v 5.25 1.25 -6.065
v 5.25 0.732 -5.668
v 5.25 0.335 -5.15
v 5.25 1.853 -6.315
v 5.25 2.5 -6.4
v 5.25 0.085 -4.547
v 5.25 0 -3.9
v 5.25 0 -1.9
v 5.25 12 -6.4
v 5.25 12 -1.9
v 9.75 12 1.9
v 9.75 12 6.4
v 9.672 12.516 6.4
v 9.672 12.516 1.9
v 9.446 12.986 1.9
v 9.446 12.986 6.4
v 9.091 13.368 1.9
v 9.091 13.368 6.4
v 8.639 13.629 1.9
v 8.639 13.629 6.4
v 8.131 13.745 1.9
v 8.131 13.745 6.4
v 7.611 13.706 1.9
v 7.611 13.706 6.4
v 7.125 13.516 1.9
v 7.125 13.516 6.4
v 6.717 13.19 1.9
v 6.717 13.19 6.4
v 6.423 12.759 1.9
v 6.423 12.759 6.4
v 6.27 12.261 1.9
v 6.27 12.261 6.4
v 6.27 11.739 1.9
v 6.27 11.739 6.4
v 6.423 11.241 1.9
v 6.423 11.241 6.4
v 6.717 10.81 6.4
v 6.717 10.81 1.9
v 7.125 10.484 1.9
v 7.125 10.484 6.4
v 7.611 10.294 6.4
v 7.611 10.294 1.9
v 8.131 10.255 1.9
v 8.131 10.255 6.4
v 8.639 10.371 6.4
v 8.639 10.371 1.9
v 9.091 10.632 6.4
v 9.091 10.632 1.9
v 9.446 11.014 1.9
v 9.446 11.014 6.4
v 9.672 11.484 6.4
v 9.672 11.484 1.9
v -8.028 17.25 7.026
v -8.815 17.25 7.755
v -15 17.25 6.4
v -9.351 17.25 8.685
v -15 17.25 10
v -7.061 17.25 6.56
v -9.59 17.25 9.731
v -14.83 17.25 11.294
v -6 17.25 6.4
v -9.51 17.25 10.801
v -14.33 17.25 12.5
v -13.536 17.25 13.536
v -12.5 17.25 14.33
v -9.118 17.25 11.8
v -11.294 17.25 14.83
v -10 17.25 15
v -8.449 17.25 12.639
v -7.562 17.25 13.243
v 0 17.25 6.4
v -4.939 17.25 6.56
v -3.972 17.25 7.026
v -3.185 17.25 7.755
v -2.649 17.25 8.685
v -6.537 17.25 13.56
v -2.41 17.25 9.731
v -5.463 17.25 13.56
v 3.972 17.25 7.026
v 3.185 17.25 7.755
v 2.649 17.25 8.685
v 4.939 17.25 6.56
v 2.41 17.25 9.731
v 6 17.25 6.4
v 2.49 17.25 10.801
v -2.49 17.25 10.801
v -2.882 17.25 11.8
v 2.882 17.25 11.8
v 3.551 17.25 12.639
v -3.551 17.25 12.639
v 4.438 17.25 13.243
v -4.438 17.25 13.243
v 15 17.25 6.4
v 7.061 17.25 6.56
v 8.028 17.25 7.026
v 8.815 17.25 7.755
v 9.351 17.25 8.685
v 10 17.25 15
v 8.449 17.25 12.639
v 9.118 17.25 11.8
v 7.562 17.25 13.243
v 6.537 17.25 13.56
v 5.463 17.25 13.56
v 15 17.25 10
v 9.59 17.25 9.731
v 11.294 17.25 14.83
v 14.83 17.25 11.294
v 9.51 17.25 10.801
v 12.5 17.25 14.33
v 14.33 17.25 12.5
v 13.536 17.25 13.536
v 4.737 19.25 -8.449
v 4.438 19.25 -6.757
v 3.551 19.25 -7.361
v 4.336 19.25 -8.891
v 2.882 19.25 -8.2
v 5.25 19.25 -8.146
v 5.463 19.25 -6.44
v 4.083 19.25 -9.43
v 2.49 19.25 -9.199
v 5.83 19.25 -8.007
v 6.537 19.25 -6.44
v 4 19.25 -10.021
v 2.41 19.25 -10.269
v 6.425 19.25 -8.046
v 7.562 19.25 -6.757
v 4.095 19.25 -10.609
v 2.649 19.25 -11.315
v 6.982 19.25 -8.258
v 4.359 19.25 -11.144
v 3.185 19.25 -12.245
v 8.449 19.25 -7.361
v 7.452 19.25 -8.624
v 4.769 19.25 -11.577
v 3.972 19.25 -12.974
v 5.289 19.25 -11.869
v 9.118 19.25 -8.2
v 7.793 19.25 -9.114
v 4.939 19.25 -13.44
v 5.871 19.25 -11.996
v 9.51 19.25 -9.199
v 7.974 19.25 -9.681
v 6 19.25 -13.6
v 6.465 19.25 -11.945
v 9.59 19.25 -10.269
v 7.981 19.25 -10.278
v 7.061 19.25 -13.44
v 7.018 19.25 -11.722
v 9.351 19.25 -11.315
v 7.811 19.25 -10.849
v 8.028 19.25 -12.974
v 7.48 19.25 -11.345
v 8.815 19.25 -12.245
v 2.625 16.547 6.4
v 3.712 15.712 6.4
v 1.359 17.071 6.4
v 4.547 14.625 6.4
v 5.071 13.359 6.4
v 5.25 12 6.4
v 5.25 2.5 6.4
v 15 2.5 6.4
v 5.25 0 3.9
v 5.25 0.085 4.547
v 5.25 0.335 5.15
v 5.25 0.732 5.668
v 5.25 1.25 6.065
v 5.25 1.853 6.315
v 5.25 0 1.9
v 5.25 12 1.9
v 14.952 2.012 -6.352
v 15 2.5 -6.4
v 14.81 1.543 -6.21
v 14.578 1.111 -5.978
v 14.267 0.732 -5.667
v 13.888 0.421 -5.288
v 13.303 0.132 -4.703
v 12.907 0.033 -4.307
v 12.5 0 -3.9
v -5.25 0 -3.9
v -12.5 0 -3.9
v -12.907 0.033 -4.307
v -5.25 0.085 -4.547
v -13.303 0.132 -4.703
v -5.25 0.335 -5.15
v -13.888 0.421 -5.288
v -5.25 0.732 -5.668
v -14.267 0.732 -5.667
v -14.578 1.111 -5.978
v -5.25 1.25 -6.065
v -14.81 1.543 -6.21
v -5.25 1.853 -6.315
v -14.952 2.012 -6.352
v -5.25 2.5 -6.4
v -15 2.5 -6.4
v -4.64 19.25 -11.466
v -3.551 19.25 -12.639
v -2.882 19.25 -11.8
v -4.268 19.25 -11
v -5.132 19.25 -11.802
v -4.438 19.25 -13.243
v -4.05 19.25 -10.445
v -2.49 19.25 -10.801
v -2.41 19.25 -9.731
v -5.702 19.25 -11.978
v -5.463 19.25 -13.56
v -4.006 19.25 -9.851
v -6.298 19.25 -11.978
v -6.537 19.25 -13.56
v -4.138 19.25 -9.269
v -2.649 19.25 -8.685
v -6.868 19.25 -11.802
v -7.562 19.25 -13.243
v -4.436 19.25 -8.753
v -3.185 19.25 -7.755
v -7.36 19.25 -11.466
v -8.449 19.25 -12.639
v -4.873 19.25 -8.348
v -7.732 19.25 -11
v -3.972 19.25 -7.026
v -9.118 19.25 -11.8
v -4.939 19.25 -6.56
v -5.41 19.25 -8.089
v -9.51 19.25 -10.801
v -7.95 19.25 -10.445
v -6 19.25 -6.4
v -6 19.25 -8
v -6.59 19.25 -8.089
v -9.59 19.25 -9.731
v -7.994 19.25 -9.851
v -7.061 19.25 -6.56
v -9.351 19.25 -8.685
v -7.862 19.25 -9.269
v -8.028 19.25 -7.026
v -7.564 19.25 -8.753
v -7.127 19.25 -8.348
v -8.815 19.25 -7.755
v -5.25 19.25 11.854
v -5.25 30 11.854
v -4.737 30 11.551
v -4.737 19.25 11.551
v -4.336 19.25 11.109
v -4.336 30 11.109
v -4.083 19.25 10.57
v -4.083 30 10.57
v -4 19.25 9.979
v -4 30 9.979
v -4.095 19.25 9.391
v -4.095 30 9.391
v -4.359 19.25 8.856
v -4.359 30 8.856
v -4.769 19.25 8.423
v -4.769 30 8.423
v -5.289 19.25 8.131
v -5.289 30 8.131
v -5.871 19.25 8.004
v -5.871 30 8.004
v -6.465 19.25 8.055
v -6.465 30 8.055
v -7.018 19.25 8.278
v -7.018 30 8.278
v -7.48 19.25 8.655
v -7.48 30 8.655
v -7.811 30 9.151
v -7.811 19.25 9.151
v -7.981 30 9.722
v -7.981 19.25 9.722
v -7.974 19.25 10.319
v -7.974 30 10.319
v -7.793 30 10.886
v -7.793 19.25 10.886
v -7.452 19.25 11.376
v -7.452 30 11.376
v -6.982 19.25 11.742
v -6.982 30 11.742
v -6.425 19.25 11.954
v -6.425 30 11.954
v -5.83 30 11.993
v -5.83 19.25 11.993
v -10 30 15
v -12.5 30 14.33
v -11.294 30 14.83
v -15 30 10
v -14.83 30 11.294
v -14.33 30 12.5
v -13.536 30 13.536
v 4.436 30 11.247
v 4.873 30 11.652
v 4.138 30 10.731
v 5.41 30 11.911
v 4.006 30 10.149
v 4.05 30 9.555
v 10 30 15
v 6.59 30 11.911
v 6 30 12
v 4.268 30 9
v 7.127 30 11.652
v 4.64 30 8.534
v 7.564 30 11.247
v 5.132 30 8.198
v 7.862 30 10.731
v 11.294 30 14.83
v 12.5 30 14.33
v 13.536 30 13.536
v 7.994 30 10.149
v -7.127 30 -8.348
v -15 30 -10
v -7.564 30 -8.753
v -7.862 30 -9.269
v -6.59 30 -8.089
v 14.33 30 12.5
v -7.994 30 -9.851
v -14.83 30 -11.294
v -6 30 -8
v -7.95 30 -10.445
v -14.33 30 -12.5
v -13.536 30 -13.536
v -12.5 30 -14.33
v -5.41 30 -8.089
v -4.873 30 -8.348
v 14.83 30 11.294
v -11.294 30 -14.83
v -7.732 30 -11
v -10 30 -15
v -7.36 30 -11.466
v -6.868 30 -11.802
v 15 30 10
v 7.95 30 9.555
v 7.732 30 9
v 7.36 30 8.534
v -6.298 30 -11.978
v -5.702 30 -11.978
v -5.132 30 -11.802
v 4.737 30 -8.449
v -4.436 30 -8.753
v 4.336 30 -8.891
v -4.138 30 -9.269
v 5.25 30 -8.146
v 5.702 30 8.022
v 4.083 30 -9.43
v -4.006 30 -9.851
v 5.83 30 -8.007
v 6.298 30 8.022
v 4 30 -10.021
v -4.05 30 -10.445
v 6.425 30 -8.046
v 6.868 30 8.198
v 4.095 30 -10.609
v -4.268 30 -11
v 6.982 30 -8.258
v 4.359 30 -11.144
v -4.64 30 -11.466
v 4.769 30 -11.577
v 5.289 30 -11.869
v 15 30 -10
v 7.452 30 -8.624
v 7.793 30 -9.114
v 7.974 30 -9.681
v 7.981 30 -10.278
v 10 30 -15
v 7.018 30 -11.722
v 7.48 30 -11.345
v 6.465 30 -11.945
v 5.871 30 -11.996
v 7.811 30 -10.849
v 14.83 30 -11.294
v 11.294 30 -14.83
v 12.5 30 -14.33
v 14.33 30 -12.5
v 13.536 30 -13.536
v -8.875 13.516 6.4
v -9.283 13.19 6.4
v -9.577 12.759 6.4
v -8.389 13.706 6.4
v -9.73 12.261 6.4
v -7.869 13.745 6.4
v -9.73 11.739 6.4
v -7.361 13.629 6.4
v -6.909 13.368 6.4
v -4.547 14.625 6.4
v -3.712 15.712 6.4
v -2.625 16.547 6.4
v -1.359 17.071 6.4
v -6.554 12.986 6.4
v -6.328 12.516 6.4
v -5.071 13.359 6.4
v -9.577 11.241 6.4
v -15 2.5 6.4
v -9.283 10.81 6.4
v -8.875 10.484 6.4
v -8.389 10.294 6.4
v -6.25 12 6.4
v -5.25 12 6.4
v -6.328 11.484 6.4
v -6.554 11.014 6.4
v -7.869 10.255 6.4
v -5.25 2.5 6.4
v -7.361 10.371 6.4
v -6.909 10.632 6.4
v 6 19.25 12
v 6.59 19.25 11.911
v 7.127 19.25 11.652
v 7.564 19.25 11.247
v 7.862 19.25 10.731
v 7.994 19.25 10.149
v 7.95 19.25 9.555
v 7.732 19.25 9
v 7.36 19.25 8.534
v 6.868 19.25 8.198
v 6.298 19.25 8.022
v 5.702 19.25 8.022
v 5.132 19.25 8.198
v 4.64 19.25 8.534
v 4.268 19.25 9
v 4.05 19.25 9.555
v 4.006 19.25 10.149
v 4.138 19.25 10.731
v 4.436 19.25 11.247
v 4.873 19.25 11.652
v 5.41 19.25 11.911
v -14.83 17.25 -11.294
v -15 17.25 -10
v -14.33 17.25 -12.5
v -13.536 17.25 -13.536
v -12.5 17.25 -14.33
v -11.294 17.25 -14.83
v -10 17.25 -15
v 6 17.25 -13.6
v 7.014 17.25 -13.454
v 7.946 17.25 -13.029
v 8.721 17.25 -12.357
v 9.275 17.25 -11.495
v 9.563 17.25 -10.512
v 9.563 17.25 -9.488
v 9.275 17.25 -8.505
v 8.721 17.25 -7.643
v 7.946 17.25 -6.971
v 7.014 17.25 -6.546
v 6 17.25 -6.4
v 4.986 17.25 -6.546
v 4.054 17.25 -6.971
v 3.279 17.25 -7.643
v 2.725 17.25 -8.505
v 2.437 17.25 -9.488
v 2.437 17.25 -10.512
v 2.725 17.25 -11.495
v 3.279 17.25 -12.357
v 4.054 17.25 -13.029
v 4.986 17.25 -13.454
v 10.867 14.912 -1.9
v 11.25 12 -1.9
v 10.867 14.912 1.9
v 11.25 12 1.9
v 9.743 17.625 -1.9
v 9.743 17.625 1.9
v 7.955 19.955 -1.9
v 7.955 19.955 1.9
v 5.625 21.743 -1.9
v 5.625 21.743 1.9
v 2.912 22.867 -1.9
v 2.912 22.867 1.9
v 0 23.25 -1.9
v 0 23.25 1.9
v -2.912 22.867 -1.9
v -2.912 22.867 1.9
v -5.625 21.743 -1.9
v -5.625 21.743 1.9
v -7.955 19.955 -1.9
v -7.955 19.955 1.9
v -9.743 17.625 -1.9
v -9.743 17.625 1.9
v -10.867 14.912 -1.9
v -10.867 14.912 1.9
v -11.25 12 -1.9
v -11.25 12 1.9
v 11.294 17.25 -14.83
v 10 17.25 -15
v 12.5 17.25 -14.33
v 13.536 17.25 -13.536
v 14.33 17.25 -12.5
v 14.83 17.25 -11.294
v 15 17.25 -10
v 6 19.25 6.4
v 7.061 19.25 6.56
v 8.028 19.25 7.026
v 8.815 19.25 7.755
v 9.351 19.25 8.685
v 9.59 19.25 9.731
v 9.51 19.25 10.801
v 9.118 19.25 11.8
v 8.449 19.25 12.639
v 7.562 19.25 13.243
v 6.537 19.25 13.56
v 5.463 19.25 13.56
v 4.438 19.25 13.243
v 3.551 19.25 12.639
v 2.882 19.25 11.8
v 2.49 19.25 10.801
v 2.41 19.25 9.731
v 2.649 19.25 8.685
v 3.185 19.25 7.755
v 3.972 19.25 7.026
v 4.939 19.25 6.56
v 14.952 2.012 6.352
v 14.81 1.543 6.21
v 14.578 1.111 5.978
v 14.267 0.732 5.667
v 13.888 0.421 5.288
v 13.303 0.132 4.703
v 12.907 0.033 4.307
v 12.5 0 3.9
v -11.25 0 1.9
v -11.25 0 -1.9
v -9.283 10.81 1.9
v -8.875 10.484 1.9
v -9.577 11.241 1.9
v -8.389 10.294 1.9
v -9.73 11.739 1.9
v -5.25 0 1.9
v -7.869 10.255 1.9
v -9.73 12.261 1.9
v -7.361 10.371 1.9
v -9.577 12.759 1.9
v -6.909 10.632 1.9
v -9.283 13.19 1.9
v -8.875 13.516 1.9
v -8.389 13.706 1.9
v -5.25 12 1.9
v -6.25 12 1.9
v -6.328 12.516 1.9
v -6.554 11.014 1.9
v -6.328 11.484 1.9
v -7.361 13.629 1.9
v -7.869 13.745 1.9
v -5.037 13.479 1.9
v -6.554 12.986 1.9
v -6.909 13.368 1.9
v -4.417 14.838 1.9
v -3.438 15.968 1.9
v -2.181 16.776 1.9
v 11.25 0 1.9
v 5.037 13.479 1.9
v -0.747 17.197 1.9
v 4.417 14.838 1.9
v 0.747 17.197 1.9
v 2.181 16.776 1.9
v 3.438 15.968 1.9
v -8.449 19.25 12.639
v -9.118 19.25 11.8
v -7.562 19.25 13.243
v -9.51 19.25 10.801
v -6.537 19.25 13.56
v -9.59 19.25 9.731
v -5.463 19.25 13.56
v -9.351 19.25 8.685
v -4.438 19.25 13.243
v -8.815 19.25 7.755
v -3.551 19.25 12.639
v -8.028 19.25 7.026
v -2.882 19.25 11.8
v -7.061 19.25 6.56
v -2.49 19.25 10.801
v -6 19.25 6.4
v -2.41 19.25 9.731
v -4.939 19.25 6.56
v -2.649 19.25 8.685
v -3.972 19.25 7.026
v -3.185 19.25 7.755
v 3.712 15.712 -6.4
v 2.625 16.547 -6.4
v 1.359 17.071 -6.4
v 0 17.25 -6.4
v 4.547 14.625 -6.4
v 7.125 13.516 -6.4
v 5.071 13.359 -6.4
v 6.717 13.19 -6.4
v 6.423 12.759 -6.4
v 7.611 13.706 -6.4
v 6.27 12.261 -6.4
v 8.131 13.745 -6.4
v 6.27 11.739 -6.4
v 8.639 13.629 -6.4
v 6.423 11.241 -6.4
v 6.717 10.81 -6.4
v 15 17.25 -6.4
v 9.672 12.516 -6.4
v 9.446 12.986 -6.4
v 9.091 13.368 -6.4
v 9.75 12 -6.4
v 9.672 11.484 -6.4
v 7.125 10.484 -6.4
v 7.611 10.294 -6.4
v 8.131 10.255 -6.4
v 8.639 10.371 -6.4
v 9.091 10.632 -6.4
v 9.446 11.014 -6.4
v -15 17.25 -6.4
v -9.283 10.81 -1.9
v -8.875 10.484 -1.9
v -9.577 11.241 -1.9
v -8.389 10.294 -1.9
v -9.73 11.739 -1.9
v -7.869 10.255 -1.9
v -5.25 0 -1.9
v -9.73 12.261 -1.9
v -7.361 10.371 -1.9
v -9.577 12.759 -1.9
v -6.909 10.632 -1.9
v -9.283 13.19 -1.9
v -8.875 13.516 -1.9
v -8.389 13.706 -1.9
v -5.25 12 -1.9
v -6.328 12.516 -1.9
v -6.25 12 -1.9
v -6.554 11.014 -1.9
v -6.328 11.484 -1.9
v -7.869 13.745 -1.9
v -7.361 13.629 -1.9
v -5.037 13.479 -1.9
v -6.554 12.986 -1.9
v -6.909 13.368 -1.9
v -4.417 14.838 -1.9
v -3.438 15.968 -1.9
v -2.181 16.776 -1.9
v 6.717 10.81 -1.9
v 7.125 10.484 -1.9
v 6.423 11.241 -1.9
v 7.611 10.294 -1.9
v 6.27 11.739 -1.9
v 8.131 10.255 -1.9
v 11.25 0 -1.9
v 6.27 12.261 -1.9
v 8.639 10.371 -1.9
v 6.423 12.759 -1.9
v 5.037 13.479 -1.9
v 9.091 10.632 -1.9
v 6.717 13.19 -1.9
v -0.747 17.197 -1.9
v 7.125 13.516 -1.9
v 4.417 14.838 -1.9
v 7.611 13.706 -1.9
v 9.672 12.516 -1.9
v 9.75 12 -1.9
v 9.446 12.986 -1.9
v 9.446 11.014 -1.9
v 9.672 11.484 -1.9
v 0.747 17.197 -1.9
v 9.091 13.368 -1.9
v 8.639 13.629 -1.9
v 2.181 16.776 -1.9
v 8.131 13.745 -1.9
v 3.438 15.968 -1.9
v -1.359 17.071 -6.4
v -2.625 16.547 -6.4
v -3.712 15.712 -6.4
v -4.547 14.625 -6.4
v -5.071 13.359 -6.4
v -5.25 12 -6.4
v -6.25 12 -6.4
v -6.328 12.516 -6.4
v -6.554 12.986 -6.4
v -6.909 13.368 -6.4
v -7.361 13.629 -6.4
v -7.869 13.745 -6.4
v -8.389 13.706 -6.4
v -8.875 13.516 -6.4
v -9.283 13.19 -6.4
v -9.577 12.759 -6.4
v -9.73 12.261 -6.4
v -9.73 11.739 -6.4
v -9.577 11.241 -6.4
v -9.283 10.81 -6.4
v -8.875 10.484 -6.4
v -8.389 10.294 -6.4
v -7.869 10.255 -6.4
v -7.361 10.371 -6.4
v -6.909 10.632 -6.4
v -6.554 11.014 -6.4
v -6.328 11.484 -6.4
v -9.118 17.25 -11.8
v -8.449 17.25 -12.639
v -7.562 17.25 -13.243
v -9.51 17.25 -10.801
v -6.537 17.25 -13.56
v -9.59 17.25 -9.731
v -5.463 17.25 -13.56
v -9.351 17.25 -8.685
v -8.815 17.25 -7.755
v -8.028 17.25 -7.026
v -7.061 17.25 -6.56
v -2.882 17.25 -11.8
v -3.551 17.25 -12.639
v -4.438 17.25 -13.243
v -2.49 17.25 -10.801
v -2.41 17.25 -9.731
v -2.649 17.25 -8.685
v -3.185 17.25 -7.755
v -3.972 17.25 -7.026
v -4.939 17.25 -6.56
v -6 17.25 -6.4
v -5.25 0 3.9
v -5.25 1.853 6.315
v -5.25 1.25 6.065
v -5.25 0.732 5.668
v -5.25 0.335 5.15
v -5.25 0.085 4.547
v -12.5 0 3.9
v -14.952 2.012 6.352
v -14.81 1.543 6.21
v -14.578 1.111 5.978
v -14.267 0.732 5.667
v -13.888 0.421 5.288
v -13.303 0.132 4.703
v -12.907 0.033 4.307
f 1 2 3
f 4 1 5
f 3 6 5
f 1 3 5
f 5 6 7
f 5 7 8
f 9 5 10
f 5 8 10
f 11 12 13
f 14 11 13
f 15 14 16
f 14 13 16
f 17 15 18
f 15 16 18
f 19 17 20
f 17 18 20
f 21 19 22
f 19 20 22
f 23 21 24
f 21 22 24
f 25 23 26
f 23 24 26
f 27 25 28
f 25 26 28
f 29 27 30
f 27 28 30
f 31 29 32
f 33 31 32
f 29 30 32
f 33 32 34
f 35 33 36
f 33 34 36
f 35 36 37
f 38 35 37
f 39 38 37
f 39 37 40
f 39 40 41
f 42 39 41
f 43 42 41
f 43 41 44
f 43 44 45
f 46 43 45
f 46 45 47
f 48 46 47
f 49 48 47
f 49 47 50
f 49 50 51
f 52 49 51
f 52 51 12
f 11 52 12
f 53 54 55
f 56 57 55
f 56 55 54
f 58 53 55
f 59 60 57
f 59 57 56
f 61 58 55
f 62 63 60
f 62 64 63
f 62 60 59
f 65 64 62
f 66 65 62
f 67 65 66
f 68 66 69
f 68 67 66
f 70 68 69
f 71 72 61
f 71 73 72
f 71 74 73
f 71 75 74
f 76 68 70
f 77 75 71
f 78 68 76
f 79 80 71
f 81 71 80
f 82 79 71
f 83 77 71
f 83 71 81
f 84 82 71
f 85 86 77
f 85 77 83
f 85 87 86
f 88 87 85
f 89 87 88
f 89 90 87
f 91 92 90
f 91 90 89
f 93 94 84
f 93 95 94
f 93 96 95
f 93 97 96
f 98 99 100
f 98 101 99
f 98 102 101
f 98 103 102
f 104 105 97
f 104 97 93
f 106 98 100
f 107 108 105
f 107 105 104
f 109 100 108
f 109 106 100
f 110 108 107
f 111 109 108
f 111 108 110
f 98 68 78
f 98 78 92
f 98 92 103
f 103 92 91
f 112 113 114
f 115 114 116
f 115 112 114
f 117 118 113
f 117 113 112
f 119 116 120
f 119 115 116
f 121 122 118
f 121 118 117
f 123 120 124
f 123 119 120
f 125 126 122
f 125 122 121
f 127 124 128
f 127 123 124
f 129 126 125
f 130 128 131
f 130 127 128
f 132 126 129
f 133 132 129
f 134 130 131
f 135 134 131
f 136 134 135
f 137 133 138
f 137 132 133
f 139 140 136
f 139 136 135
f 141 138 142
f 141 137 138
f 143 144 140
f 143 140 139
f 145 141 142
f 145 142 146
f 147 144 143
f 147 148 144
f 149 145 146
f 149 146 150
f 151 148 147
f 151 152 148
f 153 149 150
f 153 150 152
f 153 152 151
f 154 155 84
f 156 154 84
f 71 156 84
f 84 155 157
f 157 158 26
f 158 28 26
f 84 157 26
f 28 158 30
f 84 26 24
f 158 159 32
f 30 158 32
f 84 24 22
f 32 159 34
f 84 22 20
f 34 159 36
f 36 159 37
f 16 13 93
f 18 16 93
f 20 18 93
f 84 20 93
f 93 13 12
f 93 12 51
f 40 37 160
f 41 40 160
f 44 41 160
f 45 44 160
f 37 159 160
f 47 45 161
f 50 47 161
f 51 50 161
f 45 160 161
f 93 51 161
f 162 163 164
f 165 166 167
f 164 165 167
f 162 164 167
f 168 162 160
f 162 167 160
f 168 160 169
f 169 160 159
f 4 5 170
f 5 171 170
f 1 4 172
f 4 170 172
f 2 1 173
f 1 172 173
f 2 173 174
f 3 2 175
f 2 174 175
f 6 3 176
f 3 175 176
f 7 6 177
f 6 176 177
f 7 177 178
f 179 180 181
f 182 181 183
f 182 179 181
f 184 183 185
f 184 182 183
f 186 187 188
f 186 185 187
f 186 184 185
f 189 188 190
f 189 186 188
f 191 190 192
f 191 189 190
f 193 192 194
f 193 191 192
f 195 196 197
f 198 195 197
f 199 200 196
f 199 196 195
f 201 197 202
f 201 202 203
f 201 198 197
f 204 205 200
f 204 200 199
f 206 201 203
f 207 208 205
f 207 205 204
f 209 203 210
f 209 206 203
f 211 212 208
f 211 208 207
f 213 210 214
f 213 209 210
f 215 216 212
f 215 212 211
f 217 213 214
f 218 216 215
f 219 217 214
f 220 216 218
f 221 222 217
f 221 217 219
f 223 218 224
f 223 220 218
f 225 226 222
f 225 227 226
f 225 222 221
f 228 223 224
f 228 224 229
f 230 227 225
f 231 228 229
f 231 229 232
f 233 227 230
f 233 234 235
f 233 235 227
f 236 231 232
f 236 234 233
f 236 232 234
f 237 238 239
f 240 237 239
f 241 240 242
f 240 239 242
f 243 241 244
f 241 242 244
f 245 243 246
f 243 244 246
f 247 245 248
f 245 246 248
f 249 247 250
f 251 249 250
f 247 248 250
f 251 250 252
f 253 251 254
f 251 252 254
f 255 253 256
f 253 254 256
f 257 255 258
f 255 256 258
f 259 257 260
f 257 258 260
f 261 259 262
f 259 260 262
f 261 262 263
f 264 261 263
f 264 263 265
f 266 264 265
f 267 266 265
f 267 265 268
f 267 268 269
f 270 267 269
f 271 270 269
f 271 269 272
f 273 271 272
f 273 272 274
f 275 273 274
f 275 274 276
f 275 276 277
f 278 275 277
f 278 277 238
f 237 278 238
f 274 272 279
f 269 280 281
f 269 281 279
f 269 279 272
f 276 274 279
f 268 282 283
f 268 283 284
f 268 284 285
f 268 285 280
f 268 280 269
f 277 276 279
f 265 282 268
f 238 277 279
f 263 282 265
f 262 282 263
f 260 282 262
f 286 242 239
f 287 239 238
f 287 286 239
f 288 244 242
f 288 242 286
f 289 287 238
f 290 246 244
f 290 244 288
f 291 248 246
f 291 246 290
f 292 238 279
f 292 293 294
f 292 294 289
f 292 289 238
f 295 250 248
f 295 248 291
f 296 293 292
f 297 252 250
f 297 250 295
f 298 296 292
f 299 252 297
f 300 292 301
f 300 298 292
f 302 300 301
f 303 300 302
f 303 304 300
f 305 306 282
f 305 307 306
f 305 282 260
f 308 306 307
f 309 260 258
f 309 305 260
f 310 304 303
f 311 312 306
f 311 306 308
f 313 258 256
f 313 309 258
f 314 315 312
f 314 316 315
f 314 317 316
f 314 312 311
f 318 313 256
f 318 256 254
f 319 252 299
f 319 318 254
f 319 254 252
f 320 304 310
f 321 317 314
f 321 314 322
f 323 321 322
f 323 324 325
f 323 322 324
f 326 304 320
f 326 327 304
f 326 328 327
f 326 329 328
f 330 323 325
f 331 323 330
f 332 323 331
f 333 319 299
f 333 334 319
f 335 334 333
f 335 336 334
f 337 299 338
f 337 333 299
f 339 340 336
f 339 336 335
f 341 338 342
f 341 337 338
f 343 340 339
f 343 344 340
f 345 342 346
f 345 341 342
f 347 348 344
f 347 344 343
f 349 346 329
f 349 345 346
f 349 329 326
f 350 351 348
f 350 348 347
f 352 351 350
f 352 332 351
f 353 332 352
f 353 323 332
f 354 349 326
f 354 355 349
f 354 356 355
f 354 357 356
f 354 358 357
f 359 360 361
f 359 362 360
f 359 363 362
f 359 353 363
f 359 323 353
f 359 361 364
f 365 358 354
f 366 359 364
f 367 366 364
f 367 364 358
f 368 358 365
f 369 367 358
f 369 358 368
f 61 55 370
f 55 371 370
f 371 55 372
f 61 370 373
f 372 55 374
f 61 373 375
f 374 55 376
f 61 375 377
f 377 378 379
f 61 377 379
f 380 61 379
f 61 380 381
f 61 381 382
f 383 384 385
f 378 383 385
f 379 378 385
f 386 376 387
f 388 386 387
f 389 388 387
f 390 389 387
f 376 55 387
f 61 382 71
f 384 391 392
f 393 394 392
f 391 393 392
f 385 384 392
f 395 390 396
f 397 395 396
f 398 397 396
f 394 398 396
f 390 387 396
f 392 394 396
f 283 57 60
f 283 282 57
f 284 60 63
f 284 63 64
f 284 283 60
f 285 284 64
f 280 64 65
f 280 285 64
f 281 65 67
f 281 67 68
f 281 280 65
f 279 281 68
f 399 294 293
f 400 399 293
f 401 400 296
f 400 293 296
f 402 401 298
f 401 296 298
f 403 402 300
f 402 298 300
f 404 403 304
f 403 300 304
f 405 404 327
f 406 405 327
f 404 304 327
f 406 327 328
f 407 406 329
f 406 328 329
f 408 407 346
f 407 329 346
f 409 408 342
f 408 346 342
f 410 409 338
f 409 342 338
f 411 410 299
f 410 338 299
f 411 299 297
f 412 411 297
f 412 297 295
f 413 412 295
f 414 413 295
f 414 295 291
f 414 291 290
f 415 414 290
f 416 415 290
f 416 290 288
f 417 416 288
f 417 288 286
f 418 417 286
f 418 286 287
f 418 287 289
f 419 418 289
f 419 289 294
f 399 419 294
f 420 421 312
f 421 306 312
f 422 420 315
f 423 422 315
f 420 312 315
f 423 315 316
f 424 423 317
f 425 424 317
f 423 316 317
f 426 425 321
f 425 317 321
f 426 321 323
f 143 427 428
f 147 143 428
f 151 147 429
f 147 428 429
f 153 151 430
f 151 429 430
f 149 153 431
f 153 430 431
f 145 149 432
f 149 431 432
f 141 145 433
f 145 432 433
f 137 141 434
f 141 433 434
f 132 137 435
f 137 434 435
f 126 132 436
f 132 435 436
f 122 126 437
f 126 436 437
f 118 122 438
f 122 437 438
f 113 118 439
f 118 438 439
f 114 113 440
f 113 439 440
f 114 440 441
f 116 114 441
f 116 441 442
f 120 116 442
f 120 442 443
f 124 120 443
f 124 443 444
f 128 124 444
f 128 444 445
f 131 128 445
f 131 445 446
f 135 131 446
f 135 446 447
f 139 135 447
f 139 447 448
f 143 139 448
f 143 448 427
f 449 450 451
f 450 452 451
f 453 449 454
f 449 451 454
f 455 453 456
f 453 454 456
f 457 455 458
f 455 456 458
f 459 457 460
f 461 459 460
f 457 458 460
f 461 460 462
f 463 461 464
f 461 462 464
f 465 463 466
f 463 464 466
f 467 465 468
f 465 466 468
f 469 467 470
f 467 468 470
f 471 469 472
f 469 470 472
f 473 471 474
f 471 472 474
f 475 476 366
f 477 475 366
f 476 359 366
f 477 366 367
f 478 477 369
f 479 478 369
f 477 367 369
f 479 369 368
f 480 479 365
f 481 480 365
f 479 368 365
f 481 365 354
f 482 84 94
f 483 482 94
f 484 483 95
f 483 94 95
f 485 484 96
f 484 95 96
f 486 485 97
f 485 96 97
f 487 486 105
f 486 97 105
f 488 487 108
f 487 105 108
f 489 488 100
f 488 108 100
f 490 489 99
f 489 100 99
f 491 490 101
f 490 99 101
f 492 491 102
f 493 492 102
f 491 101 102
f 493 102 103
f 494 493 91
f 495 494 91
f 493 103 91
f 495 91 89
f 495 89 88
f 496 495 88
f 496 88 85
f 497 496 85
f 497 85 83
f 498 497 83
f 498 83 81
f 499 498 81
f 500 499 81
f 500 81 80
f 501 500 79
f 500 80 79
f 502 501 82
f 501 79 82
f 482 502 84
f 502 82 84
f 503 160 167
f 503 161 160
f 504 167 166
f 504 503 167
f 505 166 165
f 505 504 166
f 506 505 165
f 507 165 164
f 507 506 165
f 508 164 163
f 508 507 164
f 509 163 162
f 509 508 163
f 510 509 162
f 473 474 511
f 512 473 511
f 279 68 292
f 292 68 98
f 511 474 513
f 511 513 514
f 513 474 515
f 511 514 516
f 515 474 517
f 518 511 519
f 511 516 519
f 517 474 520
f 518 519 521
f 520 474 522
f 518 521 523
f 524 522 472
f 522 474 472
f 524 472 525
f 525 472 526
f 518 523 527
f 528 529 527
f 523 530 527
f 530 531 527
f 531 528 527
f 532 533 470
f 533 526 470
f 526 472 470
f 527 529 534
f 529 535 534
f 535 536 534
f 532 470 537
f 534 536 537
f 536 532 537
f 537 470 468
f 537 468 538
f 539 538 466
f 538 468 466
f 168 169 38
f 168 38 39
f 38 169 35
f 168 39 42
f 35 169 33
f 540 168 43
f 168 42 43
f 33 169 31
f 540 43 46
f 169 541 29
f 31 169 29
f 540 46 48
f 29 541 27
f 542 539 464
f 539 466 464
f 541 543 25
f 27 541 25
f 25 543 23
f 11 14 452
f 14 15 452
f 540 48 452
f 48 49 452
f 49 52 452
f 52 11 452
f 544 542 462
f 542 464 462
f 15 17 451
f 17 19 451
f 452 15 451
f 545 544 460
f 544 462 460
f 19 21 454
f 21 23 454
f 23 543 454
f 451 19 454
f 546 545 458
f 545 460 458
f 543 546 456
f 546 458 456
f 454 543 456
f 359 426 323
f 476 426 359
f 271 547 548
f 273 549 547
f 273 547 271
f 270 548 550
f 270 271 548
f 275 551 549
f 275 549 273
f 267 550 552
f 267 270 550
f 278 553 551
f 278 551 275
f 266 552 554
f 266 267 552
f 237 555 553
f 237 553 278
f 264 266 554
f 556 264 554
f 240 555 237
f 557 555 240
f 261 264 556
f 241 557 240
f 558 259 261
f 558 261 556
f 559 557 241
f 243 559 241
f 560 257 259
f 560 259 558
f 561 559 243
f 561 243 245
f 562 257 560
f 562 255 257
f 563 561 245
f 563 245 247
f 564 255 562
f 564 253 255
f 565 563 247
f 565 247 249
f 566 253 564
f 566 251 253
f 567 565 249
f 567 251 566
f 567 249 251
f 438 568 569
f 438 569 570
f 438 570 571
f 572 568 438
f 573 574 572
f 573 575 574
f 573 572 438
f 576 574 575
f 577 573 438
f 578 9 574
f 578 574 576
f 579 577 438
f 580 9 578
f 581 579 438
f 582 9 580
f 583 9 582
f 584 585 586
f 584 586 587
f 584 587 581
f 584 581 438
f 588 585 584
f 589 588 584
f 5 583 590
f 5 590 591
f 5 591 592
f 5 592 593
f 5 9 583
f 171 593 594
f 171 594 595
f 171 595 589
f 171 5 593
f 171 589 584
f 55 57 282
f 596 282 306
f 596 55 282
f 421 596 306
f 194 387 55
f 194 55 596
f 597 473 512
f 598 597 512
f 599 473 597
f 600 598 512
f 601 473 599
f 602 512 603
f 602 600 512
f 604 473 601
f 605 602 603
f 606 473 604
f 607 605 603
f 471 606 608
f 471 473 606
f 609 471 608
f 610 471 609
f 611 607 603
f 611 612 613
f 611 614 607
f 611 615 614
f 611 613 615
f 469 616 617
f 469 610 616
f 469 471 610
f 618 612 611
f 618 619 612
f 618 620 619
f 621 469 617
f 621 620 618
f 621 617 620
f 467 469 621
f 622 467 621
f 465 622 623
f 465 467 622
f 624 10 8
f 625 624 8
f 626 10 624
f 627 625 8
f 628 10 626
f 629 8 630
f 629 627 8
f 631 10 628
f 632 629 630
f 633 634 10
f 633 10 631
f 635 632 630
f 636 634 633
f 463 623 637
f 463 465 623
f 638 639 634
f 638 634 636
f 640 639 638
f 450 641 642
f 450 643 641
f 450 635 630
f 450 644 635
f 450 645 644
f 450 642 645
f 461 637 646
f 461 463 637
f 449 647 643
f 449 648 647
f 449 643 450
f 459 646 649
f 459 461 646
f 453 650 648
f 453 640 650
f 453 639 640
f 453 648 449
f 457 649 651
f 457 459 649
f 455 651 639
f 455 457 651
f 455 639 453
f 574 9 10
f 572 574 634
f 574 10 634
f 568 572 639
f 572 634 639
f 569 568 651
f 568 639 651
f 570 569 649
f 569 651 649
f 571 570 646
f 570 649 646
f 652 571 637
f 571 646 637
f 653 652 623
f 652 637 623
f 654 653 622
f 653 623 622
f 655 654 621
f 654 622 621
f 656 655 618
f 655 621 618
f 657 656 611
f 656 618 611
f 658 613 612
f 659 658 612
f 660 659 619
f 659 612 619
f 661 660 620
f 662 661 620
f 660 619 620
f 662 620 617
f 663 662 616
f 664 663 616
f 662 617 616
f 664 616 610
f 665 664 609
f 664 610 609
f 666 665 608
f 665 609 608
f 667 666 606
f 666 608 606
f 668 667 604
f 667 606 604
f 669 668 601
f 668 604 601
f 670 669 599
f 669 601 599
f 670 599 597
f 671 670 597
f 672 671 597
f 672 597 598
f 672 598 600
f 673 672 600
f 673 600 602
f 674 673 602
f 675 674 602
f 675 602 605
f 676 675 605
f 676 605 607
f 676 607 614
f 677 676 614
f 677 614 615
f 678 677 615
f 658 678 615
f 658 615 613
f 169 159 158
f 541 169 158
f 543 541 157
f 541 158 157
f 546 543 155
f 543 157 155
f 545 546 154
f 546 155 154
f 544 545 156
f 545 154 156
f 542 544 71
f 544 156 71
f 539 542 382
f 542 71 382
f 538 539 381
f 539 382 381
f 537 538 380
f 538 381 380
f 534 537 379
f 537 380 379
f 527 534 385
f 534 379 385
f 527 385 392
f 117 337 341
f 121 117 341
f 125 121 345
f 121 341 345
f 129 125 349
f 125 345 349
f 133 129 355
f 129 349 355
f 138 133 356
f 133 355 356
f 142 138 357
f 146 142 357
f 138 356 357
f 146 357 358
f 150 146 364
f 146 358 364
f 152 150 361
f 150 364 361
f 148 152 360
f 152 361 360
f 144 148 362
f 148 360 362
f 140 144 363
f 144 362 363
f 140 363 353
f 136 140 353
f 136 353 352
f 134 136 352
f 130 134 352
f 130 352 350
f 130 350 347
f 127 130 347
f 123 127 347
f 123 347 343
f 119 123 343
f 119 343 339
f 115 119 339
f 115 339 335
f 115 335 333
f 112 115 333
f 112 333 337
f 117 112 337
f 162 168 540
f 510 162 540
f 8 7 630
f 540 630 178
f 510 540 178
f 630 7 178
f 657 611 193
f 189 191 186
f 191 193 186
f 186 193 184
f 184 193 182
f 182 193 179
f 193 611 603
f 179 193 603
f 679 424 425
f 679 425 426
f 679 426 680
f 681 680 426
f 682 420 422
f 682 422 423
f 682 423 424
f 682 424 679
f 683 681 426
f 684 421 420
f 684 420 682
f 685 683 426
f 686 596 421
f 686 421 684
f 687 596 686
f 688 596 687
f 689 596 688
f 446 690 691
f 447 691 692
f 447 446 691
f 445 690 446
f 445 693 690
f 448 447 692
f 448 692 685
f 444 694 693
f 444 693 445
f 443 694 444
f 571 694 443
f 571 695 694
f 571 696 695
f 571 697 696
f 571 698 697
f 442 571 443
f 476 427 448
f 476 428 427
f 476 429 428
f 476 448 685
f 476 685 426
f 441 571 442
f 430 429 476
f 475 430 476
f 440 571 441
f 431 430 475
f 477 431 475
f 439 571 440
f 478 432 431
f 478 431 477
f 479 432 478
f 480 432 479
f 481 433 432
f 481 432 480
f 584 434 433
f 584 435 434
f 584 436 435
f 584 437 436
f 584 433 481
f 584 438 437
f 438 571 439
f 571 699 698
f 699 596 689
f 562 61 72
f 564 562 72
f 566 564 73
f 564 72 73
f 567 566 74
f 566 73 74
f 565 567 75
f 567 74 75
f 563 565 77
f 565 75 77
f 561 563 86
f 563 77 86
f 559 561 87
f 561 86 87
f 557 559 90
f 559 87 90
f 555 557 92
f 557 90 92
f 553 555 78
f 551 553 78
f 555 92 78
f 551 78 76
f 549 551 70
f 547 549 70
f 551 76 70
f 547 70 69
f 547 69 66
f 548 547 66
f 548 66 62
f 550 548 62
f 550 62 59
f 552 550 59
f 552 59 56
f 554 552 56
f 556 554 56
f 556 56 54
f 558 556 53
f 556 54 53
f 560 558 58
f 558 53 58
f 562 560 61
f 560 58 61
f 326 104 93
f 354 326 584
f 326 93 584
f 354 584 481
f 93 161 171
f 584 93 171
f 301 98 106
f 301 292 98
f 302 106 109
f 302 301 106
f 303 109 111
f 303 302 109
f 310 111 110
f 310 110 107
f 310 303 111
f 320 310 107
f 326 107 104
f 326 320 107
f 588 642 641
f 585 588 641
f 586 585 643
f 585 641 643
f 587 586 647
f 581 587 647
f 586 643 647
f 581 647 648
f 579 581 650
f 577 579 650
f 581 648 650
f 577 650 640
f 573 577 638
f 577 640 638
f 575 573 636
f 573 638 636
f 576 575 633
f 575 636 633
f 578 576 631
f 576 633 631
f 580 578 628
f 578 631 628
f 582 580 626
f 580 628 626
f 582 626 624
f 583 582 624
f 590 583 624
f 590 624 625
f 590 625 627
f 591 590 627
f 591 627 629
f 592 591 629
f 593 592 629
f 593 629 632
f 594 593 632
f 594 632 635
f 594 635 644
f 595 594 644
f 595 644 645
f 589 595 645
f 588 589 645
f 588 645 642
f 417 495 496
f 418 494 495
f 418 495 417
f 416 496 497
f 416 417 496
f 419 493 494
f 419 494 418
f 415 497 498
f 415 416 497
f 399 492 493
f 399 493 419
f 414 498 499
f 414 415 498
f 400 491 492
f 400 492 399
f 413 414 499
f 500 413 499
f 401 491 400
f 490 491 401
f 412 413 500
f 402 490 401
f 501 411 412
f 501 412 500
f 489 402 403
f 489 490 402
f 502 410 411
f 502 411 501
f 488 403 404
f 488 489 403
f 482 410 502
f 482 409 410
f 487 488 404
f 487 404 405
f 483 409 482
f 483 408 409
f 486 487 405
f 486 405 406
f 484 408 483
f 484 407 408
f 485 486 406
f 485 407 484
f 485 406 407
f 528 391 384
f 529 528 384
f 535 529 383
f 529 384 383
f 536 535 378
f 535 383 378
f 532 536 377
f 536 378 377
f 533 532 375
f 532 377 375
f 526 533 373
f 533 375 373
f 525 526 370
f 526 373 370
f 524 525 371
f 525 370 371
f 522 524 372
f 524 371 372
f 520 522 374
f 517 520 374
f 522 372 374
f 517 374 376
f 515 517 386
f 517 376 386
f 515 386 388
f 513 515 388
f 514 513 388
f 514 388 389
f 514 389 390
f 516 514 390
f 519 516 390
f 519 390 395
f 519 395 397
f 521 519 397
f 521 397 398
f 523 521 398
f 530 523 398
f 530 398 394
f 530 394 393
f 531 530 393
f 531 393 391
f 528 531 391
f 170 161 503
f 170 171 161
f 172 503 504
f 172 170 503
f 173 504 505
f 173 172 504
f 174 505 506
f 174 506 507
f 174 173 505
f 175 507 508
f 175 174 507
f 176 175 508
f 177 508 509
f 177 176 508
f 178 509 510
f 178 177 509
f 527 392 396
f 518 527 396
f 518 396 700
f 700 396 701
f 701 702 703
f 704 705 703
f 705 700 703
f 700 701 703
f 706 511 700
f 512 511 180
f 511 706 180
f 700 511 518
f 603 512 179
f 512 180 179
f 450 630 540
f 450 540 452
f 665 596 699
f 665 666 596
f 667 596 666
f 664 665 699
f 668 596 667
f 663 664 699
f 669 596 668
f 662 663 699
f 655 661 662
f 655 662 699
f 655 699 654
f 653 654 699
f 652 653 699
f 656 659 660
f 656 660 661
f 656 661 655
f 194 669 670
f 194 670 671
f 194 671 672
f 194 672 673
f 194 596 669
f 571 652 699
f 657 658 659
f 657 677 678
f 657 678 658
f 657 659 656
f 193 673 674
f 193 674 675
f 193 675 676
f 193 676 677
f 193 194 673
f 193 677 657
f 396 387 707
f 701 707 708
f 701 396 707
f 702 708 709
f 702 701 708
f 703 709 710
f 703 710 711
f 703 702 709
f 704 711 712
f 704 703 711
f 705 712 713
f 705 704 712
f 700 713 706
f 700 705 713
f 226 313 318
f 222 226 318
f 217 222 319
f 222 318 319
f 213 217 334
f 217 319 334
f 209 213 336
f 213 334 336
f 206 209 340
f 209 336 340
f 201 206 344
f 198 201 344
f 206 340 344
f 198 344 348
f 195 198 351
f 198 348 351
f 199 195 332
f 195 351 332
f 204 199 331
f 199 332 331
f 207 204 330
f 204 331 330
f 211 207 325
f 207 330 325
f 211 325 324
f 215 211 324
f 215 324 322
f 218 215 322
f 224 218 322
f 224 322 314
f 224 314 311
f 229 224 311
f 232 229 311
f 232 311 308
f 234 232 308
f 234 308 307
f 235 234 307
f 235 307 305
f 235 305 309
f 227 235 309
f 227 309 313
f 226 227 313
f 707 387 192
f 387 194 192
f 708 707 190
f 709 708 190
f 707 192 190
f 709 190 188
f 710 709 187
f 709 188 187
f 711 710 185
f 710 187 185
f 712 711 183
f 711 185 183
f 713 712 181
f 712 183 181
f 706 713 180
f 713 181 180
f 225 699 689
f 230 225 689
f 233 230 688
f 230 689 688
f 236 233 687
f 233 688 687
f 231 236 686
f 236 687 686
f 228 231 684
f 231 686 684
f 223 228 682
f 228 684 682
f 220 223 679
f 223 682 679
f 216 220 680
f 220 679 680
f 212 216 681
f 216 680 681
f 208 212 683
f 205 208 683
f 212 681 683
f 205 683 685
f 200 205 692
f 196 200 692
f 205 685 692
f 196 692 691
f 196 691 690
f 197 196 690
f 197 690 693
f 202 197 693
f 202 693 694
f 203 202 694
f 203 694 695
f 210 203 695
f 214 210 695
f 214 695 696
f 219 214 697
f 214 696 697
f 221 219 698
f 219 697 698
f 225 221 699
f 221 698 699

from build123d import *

# Parameters (mm, degrees)
SKETCH2_W               = 30
SKETCH2_H               = 30
BOSS_EXTRUDE1_DEPTH     = 30
CUT_EXTRUDE1_REACH      = 47
SKETCH3_R               = 1.75
CUT_EXTRUDE2_START      = -15
SKETCH4_R               = 1.75
CUT_EXTRUDE2_DEPTH      = 1.9
CUT_EXTRUDE2_DEPTH_BACK = 1.9
CUT_EXTRUDE3_REACH      = 38.742
SKETCH5_R               = 2
SKETCH6_W               = 30
SKETCH6_H               = 8.6
CUT_EXTRUDE5_DEPTH      = 17.25
SKETCH8_R               = 3.6
CUT_EXTRUDE6_DEPTH      = 2
FILLET1_R               = 5
FILLET2_R               = 2.5


with BuildPart() as part:
    # Sketch2 → Boss-Extrude1 (new body)
    with BuildSketch(Plane(origin=(0, 0, 0), x_dir=(1, 0, 0), z_dir=(0, 1, 0))):
        Rectangle(SKETCH2_W, SKETCH2_H)
    extrude(amount=BOSS_EXTRUDE1_DEPTH)

    # Sketch3 → Cut-Extrude1 (cut, up to next)
    with BuildSketch(Plane.XY.offset(15), mode=Mode.PRIVATE) as cut_extrude1_sk1:
        with Locations((-8, 12)):
            Circle(SKETCH3_R)
    cut_extrude1_tool1 = extrude(cut_extrude1_sk1.sketch, amount=-CUT_EXTRUDE1_REACH, mode=Mode.PRIVATE) & part.part
    # Sketch3 → Cut-Extrude1 (cut, up to next)
    with BuildSketch(Plane.XY.offset(15), mode=Mode.PRIVATE) as cut_extrude1_sk2:
        with Locations((8, 12)):
            Circle(SKETCH3_R)
    cut_extrude1_tool2 = extrude(cut_extrude1_sk2.sketch, amount=-CUT_EXTRUDE1_REACH, mode=Mode.PRIVATE) & part.part
    # Sketch3 → Cut-Extrude1 (cut, up to next)
    with BuildSketch(Plane.XY.offset(15), mode=Mode.PRIVATE) as cut_extrude1_sk3:
        with BuildLine():
            ThreePointArc((5.25, 12), (0, 17.25), (-5.25, 12))
            Line((-5.25, 12), (5.25, 12))
        make_face()
    cut_extrude1_tool3 = extrude(cut_extrude1_sk3.sketch, amount=-CUT_EXTRUDE1_REACH, mode=Mode.PRIVATE) & part.part
    # Sketch3 → Cut-Extrude1 (cut, up to next)
    with BuildSketch(Plane.XY.offset(15), mode=Mode.PRIVATE) as cut_extrude1_sk4:
        with BuildLine():
            Line((5.25, 12), (-5.25, 12))
            ThreePointArc((-5.25, 12), (0, 6.75), (5.25, 12))
        make_face()
    cut_extrude1_tool4 = extrude(cut_extrude1_sk4.sketch, amount=-CUT_EXTRUDE1_REACH, mode=Mode.PRIVATE) & part.part
    # Sketch3 → Cut-Extrude1 (cut, up to next)
    with BuildSketch(Plane.XY.offset(15), mode=Mode.PRIVATE) as cut_extrude1_sk5:
        with BuildLine():
            ThreePointArc((5.25, 12), (0, 17.25), (-5.25, 12))
            Line((-5.25, 12), (5.25, 12))
        make_face()
    cut_extrude1_tool5 = extrude(cut_extrude1_sk5.sketch, amount=-CUT_EXTRUDE1_REACH, mode=Mode.PRIVATE) & part.part
    # Sketch3 → Cut-Extrude1 (cut, up to next)
    with BuildSketch(Plane.XY.offset(15), mode=Mode.PRIVATE) as cut_extrude1_sk6:
        with BuildLine():
            Line((5.25, 12), (-5.25, 12))
            ThreePointArc((-5.25, 12), (0, 6.75), (5.25, 12))
        make_face()
    cut_extrude1_tool6 = extrude(cut_extrude1_sk6.sketch, amount=-CUT_EXTRUDE1_REACH, mode=Mode.PRIVATE) & part.part
    # Sketch3 → Cut-Extrude1 (cut, up to next)
    with BuildSketch(Plane.XY.offset(15), mode=Mode.PRIVATE) as cut_extrude1_sk7:
        with BuildLine():
            ThreePointArc((5.25, 12), (0, 6.75), (-5.25, 12))
            Line((-5.25, 12), (-5.25, 0))
            Line((-5.25, 0), (5.25, 0))
            Line((5.25, 0), (5.25, 12))
        make_face()
    cut_extrude1_tool7 = extrude(cut_extrude1_sk7.sketch, amount=-CUT_EXTRUDE1_REACH, mode=Mode.PRIVATE) & part.part
    add(cut_extrude1_tool1.solids().sort_by_distance((-8, 12, 15))[0], mode=Mode.SUBTRACT)
    add(cut_extrude1_tool2.solids().sort_by_distance((8, 12, 15))[0], mode=Mode.SUBTRACT)
    add(cut_extrude1_tool3.solids().sort_by_distance((0, 14.228169, 15))[0], mode=Mode.SUBTRACT)
    add(cut_extrude1_tool4.solids().sort_by_distance((0, 9.771831, 15))[0], mode=Mode.SUBTRACT)
    add(cut_extrude1_tool5.solids().sort_by_distance((0, 14.228169, 15))[0], mode=Mode.SUBTRACT)
    add(cut_extrude1_tool6.solids().sort_by_distance((0, 9.771831, 15))[0], mode=Mode.SUBTRACT)
    add(cut_extrude1_tool7.solids().sort_by_distance((0, 4.02549, 15))[0], mode=Mode.SUBTRACT)

    # Sketch4 → Cut-Extrude2 (cut, two sides)
    with BuildSketch(Plane.XY.offset(15).offset(CUT_EXTRUDE2_START)) as cut_extrude2_sk:
        with BuildLine():
            Line((-5.25, 0), (-5.25, 12))
            ThreePointArc((-5.25, 12), (0, 17.25), (5.25, 12))
            Line((5.25, 12), (5.25, 0))
            Line((5.25, 0), (11.25, 0))
            Line((11.25, 0), (11.25, 12))
            ThreePointArc((11.25, 12), (0, 23.25), (-11.25, 12))
            Line((-11.25, 12), (-11.25, 0))
            Line((-11.25, 0), (-5.25, 0))
        make_face()
        with Locations((8, 12)):
            Circle(SKETCH4_R, mode=Mode.SUBTRACT)
        with Locations((-8, 12)):
            Circle(SKETCH4_R, mode=Mode.SUBTRACT)
    extrude(amount=CUT_EXTRUDE2_DEPTH, mode=Mode.SUBTRACT)
    extrude(cut_extrude2_sk.sketch, amount=-CUT_EXTRUDE2_DEPTH_BACK, mode=Mode.SUBTRACT)

    # Sketch5 → Cut-Extrude3 (cut, up to next)
    with BuildSketch(Plane(origin=(0, 30, 0), x_dir=(1, 0, 0), z_dir=(0, 1, 0)), mode=Mode.PRIVATE) as cut_extrude3_sk1:
        with Locations(Location((-6, 10, 0), (0, 0, 270))):
            Circle(SKETCH5_R)
    cut_extrude3_tool1 = extrude(cut_extrude3_sk1.sketch, amount=-CUT_EXTRUDE3_REACH, mode=Mode.PRIVATE) & part.part
    # Sketch5 → Cut-Extrude3 (cut, up to next)
    with BuildSketch(Plane(origin=(0, 30, 0), x_dir=(1, 0, 0), z_dir=(0, 1, 0)), mode=Mode.PRIVATE) as cut_extrude3_sk2:
        with Locations(Location((6, 10, 0), (0, 0, 247.975687163))):
            Circle(SKETCH5_R)
    cut_extrude3_tool2 = extrude(cut_extrude3_sk2.sketch, amount=-CUT_EXTRUDE3_REACH, mode=Mode.PRIVATE) & part.part
    # Sketch5 → Cut-Extrude3 (cut, up to next)
    with BuildSketch(Plane(origin=(0, 30, 0), x_dir=(1, 0, 0), z_dir=(0, 1, 0)), mode=Mode.PRIVATE) as cut_extrude3_sk3:
        with Locations(Location((6, -10, 0), (0, 0, 270))):
            Circle(SKETCH5_R)
    cut_extrude3_tool3 = extrude(cut_extrude3_sk3.sketch, amount=-CUT_EXTRUDE3_REACH, mode=Mode.PRIVATE) & part.part
    # Sketch5 → Cut-Extrude3 (cut, up to next)
    with BuildSketch(Plane(origin=(0, 30, 0), x_dir=(1, 0, 0), z_dir=(0, 1, 0)), mode=Mode.PRIVATE) as cut_extrude3_sk4:
        with Locations(Location((-6, -10, 0), (0, 0, 292.024312837))):
            Circle(SKETCH5_R)
    cut_extrude3_tool4 = extrude(cut_extrude3_sk4.sketch, amount=-CUT_EXTRUDE3_REACH, mode=Mode.PRIVATE) & part.part
    add(cut_extrude3_tool1.solids().sort_by_distance((-6, 30, -10))[0], mode=Mode.SUBTRACT)
    add(cut_extrude3_tool2.solids().sort_by_distance((6, 30, -10))[0], mode=Mode.SUBTRACT)
    add(cut_extrude3_tool3.solids().sort_by_distance((6, 30, 10))[0], mode=Mode.SUBTRACT)
    add(cut_extrude3_tool4.solids().sort_by_distance((-6, 30, 10))[0], mode=Mode.SUBTRACT)

    # Sketch6 → Cut-Extrude5 (cut)
    with BuildSketch(Plane.XZ):
        with Locations((0, 10.7)):
            Rectangle(SKETCH6_W, SKETCH6_H)
        with Locations((0, -10.7)):
            Rectangle(SKETCH6_W, SKETCH6_H)
    extrude(amount=-CUT_EXTRUDE5_DEPTH, mode=Mode.SUBTRACT)

    # Sketch8 → Cut-Extrude6 (cut)
    with BuildSketch(Plane.XZ.offset(-17.25)):
        with Locations(Location((-6, 10, 0), (0, 0, 270))):
            Circle(SKETCH8_R)
        with Locations(Location((6, 10, 0), (0, 0, 270))):
            Circle(SKETCH8_R)
        with Locations(Location((6, -10, 0), (0, 0, 270))):
            Circle(SKETCH8_R)
        with Locations(Location((-6, -10, 0), (0, 0, 90))):
            Circle(SKETCH8_R)
    extrude(amount=-CUT_EXTRUDE6_DEPTH, mode=Mode.SUBTRACT)

    # Fillet1
    fillet1_edges = [part.edges().sort_by_distance(p)[0] for p in [
        (15, 23.625, 15),
        (-15, 23.625, 15),
        (-15, 23.625, -15),
        (15, 23.625, -15),
    ]]
    fillet(fillet1_edges, radius=FILLET1_R)

    # Fillet2
    fillet2_edges = [part.edges().sort_by_distance(p)[0] for p in [
        (-15, 0, 0),
        (15, 0, 0),
        (-10.125, 0, -6.4),
        (10.125, 0, -6.4),
        (-10.125, 0, 6.4),
        (10.125, 0, 6.4),
    ]]
    fillet(fillet2_edges, radius=FILLET2_R)


solid = part.part
